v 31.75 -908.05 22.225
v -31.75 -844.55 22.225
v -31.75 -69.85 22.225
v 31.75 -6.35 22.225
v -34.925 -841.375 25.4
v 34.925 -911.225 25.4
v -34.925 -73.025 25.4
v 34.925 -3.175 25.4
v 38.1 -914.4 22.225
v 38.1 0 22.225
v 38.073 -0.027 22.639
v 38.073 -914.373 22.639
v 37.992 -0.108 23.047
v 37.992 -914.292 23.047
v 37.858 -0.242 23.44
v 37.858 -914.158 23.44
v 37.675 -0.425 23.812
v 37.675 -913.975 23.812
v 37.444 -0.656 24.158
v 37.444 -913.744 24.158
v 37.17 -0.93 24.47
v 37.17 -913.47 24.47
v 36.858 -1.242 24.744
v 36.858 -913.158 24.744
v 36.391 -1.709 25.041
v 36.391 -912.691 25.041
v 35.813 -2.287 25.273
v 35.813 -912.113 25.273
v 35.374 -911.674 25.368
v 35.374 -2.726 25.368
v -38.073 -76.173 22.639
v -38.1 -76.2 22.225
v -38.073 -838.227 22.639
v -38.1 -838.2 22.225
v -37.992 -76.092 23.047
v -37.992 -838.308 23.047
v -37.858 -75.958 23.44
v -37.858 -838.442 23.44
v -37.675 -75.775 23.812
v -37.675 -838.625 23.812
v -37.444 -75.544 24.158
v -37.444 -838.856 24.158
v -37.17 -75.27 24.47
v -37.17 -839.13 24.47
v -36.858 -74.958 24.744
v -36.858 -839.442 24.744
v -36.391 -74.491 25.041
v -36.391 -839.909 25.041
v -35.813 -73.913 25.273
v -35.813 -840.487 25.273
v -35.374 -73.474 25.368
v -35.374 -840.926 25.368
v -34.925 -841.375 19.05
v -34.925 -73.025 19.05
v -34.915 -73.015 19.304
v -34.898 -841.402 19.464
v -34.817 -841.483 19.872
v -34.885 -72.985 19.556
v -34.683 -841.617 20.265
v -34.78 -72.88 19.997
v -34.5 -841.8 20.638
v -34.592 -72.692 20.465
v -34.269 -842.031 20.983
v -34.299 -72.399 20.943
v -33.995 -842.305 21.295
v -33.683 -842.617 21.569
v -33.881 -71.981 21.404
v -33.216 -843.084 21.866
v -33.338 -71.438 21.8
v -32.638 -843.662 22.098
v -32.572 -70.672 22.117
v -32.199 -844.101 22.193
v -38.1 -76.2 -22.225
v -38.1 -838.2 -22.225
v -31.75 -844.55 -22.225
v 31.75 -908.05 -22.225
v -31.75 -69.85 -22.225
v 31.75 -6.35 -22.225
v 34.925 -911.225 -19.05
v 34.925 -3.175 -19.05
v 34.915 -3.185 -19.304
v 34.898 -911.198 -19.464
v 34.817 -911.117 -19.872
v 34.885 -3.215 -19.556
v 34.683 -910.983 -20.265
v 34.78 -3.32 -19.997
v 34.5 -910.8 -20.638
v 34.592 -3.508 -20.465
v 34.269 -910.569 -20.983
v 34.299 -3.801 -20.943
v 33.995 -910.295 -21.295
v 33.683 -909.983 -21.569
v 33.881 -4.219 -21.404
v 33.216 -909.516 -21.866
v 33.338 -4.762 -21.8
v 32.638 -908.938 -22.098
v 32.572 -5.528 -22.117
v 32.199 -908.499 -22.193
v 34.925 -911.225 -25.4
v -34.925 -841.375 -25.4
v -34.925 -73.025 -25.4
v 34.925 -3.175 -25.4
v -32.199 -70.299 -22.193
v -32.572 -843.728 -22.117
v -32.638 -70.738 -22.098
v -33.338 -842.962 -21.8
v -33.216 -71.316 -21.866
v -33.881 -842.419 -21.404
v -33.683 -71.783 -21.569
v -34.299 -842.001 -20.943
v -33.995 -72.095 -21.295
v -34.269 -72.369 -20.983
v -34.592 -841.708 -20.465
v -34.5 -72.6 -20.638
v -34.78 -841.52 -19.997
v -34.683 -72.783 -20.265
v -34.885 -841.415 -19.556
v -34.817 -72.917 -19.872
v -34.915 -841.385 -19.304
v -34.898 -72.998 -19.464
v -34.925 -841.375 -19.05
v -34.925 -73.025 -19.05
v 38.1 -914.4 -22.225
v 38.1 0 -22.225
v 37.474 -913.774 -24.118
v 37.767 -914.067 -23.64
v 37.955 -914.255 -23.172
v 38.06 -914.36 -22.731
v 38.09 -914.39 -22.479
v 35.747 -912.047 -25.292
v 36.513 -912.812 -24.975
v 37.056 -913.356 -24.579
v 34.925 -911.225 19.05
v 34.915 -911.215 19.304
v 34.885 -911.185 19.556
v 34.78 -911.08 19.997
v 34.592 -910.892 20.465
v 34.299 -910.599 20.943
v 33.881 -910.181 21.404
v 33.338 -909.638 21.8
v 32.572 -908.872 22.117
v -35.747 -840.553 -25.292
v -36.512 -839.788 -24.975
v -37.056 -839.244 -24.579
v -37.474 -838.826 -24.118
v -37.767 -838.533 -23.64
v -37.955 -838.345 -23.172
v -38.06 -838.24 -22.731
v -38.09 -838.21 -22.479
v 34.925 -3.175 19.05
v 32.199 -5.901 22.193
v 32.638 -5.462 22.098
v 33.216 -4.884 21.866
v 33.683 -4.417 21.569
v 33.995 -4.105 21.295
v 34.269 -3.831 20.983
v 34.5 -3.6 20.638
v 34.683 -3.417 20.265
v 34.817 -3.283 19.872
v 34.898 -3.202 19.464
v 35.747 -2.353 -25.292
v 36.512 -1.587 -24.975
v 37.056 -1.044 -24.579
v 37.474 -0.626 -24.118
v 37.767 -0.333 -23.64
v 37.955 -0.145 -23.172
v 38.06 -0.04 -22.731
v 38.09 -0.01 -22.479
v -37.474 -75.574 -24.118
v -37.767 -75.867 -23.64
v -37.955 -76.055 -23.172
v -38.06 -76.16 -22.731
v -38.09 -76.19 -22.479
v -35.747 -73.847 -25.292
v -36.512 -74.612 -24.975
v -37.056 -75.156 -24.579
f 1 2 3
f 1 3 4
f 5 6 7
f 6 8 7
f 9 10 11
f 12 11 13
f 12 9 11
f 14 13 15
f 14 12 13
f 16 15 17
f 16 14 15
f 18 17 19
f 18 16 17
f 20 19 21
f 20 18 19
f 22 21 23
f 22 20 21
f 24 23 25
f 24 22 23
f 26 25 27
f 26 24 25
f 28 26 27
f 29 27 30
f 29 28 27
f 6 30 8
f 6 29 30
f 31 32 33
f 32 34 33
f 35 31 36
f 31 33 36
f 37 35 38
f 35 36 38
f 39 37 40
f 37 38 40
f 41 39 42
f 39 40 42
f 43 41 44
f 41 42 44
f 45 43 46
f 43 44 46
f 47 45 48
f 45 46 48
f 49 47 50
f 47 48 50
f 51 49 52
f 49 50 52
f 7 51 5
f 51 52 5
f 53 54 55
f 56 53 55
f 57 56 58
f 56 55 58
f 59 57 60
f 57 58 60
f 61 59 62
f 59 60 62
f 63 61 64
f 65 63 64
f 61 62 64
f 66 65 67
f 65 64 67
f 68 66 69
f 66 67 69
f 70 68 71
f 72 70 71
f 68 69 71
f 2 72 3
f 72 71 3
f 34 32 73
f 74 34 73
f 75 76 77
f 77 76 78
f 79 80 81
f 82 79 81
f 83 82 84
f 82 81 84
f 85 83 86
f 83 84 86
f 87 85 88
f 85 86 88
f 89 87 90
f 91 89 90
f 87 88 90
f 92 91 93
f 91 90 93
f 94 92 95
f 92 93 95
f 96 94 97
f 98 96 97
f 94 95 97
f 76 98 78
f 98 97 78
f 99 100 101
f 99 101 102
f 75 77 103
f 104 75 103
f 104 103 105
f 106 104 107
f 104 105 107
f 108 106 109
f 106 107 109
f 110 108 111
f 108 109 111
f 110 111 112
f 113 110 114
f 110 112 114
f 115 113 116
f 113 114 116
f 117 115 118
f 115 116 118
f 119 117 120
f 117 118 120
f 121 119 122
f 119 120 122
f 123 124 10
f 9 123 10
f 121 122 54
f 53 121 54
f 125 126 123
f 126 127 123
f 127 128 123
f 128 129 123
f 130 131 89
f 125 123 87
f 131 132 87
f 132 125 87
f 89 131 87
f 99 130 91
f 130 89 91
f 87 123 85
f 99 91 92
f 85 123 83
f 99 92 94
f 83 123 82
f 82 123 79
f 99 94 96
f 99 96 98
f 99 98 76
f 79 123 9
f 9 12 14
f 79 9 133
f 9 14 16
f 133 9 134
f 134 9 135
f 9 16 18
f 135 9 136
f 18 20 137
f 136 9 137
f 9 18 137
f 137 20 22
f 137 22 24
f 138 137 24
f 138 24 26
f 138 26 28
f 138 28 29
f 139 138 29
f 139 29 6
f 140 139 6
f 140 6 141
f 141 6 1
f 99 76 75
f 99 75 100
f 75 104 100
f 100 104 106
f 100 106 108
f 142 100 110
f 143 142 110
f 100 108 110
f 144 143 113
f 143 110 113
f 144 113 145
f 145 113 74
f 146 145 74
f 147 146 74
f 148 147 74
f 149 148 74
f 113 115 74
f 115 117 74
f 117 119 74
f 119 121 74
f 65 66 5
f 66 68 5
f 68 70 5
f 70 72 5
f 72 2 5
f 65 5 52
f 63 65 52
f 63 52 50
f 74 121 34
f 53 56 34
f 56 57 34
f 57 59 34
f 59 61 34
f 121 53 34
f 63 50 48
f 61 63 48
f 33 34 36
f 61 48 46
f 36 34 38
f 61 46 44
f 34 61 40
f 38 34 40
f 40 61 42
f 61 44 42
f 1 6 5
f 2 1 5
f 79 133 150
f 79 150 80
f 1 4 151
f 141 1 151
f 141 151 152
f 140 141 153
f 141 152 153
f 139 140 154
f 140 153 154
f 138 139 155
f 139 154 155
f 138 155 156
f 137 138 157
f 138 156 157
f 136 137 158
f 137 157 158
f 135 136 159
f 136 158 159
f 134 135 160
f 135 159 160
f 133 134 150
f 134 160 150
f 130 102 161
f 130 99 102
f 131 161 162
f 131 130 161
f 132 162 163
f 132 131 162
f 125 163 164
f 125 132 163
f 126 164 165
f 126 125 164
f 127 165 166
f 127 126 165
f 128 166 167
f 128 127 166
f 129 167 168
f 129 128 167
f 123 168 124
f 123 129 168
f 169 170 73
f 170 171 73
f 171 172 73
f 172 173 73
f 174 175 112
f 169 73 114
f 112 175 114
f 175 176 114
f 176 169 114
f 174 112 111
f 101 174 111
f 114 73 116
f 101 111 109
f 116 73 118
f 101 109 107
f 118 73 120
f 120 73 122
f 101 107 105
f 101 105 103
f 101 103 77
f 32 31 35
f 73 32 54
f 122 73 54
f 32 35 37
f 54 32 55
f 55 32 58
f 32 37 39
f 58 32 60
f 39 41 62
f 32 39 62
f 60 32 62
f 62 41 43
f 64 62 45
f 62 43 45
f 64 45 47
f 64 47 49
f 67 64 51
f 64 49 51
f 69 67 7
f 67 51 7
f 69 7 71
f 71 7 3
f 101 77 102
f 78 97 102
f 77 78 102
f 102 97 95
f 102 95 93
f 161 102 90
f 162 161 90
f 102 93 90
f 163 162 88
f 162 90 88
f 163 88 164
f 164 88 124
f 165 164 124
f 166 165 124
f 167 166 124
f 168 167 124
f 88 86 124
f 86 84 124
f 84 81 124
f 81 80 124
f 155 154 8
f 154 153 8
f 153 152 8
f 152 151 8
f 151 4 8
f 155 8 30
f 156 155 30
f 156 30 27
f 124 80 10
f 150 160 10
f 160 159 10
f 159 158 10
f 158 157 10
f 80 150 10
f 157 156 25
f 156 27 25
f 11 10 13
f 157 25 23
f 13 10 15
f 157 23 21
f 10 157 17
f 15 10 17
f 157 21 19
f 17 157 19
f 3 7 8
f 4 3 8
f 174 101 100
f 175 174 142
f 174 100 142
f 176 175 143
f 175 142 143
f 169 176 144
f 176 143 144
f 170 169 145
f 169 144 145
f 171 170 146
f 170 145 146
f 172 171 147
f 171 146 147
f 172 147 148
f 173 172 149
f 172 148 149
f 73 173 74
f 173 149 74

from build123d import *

# Parameters (mm, degrees)
F2_DEPTH = 914.4
F4_DEPTH = 50.801
F6_DEPTH = 50.801
F7_R     = 3.175


# Not quite as in the source:
# - a variable given as a bare number and used for a length is read in inches; the dataset says mm whatever the document's units were


with BuildPart() as f2:
    # F0 (on Front) → F2 (new body)
    with BuildSketch(Plane.XZ):
        Polygon((-38.1, 22.225), (-38.1, -22.225), (-38.1, -25.4), (-34.925, -25.4), (34.925, -25.4), (38.1, -25.4), (38.1, -22.225), (38.1, 22.225), (38.1, 25.4), (34.925, 25.4), (-34.925, 25.4), (-38.1, 25.4), align=None)
        with BuildLine():
            ThreePointArc((31.75, 22.225), (33.9950640303, 21.2950640303), (34.925, 19.05))
            Line((34.925, 19.05), (34.925, -19.05))
            ThreePointArc((34.925, -19.05), (33.9950640303, -21.2950640303), (31.75, -22.225))
            Line((31.75, -22.225), (-31.75, -22.225))
            ThreePointArc((-31.75, -22.225), (-33.9950640303, -21.2950640303), (-34.925, -19.05))
            Line((-34.925, -19.05), (-34.925, 19.05))
            ThreePointArc((-34.925, 19.05), (-33.9950640303, 21.2950640303), (-31.75, 22.225))
            Line((-31.75, 22.225), (31.75, 22.225))
        make_face(mode=Mode.SUBTRACT)
    extrude(amount=F2_DEPTH)

    # F3 (on face) → F4 (cut, through all)
    with BuildSketch(Plane.XY.offset(25.4)):
        Polygon((38.1, 0), (-38.1, 0), (-38.1, -76.2), align=None)
    extrude(amount=-F4_DEPTH, mode=Mode.SUBTRACT)

    # F5 (on face) → F6 (cut, through all)
    with BuildSketch(Plane.XY.offset(25.4)):
        Polygon((-38.1, -914.4), (38.1, -914.4), (-38.1, -838.2), align=None)
    extrude(amount=-F6_DEPTH, mode=Mode.SUBTRACT)

    # F7
    f7_edges = [f2.edges().sort_by_distance(p)[0] for p in [
        (-38.1, -457.2, 25.4),
        (-38.1, -457.2, -25.4),
        (38.1, -457.2, 25.4),
        (38.1, -457.2, -25.4),
    ]]
    fillet(f7_edges, radius=F7_R)


solid = f2.part
